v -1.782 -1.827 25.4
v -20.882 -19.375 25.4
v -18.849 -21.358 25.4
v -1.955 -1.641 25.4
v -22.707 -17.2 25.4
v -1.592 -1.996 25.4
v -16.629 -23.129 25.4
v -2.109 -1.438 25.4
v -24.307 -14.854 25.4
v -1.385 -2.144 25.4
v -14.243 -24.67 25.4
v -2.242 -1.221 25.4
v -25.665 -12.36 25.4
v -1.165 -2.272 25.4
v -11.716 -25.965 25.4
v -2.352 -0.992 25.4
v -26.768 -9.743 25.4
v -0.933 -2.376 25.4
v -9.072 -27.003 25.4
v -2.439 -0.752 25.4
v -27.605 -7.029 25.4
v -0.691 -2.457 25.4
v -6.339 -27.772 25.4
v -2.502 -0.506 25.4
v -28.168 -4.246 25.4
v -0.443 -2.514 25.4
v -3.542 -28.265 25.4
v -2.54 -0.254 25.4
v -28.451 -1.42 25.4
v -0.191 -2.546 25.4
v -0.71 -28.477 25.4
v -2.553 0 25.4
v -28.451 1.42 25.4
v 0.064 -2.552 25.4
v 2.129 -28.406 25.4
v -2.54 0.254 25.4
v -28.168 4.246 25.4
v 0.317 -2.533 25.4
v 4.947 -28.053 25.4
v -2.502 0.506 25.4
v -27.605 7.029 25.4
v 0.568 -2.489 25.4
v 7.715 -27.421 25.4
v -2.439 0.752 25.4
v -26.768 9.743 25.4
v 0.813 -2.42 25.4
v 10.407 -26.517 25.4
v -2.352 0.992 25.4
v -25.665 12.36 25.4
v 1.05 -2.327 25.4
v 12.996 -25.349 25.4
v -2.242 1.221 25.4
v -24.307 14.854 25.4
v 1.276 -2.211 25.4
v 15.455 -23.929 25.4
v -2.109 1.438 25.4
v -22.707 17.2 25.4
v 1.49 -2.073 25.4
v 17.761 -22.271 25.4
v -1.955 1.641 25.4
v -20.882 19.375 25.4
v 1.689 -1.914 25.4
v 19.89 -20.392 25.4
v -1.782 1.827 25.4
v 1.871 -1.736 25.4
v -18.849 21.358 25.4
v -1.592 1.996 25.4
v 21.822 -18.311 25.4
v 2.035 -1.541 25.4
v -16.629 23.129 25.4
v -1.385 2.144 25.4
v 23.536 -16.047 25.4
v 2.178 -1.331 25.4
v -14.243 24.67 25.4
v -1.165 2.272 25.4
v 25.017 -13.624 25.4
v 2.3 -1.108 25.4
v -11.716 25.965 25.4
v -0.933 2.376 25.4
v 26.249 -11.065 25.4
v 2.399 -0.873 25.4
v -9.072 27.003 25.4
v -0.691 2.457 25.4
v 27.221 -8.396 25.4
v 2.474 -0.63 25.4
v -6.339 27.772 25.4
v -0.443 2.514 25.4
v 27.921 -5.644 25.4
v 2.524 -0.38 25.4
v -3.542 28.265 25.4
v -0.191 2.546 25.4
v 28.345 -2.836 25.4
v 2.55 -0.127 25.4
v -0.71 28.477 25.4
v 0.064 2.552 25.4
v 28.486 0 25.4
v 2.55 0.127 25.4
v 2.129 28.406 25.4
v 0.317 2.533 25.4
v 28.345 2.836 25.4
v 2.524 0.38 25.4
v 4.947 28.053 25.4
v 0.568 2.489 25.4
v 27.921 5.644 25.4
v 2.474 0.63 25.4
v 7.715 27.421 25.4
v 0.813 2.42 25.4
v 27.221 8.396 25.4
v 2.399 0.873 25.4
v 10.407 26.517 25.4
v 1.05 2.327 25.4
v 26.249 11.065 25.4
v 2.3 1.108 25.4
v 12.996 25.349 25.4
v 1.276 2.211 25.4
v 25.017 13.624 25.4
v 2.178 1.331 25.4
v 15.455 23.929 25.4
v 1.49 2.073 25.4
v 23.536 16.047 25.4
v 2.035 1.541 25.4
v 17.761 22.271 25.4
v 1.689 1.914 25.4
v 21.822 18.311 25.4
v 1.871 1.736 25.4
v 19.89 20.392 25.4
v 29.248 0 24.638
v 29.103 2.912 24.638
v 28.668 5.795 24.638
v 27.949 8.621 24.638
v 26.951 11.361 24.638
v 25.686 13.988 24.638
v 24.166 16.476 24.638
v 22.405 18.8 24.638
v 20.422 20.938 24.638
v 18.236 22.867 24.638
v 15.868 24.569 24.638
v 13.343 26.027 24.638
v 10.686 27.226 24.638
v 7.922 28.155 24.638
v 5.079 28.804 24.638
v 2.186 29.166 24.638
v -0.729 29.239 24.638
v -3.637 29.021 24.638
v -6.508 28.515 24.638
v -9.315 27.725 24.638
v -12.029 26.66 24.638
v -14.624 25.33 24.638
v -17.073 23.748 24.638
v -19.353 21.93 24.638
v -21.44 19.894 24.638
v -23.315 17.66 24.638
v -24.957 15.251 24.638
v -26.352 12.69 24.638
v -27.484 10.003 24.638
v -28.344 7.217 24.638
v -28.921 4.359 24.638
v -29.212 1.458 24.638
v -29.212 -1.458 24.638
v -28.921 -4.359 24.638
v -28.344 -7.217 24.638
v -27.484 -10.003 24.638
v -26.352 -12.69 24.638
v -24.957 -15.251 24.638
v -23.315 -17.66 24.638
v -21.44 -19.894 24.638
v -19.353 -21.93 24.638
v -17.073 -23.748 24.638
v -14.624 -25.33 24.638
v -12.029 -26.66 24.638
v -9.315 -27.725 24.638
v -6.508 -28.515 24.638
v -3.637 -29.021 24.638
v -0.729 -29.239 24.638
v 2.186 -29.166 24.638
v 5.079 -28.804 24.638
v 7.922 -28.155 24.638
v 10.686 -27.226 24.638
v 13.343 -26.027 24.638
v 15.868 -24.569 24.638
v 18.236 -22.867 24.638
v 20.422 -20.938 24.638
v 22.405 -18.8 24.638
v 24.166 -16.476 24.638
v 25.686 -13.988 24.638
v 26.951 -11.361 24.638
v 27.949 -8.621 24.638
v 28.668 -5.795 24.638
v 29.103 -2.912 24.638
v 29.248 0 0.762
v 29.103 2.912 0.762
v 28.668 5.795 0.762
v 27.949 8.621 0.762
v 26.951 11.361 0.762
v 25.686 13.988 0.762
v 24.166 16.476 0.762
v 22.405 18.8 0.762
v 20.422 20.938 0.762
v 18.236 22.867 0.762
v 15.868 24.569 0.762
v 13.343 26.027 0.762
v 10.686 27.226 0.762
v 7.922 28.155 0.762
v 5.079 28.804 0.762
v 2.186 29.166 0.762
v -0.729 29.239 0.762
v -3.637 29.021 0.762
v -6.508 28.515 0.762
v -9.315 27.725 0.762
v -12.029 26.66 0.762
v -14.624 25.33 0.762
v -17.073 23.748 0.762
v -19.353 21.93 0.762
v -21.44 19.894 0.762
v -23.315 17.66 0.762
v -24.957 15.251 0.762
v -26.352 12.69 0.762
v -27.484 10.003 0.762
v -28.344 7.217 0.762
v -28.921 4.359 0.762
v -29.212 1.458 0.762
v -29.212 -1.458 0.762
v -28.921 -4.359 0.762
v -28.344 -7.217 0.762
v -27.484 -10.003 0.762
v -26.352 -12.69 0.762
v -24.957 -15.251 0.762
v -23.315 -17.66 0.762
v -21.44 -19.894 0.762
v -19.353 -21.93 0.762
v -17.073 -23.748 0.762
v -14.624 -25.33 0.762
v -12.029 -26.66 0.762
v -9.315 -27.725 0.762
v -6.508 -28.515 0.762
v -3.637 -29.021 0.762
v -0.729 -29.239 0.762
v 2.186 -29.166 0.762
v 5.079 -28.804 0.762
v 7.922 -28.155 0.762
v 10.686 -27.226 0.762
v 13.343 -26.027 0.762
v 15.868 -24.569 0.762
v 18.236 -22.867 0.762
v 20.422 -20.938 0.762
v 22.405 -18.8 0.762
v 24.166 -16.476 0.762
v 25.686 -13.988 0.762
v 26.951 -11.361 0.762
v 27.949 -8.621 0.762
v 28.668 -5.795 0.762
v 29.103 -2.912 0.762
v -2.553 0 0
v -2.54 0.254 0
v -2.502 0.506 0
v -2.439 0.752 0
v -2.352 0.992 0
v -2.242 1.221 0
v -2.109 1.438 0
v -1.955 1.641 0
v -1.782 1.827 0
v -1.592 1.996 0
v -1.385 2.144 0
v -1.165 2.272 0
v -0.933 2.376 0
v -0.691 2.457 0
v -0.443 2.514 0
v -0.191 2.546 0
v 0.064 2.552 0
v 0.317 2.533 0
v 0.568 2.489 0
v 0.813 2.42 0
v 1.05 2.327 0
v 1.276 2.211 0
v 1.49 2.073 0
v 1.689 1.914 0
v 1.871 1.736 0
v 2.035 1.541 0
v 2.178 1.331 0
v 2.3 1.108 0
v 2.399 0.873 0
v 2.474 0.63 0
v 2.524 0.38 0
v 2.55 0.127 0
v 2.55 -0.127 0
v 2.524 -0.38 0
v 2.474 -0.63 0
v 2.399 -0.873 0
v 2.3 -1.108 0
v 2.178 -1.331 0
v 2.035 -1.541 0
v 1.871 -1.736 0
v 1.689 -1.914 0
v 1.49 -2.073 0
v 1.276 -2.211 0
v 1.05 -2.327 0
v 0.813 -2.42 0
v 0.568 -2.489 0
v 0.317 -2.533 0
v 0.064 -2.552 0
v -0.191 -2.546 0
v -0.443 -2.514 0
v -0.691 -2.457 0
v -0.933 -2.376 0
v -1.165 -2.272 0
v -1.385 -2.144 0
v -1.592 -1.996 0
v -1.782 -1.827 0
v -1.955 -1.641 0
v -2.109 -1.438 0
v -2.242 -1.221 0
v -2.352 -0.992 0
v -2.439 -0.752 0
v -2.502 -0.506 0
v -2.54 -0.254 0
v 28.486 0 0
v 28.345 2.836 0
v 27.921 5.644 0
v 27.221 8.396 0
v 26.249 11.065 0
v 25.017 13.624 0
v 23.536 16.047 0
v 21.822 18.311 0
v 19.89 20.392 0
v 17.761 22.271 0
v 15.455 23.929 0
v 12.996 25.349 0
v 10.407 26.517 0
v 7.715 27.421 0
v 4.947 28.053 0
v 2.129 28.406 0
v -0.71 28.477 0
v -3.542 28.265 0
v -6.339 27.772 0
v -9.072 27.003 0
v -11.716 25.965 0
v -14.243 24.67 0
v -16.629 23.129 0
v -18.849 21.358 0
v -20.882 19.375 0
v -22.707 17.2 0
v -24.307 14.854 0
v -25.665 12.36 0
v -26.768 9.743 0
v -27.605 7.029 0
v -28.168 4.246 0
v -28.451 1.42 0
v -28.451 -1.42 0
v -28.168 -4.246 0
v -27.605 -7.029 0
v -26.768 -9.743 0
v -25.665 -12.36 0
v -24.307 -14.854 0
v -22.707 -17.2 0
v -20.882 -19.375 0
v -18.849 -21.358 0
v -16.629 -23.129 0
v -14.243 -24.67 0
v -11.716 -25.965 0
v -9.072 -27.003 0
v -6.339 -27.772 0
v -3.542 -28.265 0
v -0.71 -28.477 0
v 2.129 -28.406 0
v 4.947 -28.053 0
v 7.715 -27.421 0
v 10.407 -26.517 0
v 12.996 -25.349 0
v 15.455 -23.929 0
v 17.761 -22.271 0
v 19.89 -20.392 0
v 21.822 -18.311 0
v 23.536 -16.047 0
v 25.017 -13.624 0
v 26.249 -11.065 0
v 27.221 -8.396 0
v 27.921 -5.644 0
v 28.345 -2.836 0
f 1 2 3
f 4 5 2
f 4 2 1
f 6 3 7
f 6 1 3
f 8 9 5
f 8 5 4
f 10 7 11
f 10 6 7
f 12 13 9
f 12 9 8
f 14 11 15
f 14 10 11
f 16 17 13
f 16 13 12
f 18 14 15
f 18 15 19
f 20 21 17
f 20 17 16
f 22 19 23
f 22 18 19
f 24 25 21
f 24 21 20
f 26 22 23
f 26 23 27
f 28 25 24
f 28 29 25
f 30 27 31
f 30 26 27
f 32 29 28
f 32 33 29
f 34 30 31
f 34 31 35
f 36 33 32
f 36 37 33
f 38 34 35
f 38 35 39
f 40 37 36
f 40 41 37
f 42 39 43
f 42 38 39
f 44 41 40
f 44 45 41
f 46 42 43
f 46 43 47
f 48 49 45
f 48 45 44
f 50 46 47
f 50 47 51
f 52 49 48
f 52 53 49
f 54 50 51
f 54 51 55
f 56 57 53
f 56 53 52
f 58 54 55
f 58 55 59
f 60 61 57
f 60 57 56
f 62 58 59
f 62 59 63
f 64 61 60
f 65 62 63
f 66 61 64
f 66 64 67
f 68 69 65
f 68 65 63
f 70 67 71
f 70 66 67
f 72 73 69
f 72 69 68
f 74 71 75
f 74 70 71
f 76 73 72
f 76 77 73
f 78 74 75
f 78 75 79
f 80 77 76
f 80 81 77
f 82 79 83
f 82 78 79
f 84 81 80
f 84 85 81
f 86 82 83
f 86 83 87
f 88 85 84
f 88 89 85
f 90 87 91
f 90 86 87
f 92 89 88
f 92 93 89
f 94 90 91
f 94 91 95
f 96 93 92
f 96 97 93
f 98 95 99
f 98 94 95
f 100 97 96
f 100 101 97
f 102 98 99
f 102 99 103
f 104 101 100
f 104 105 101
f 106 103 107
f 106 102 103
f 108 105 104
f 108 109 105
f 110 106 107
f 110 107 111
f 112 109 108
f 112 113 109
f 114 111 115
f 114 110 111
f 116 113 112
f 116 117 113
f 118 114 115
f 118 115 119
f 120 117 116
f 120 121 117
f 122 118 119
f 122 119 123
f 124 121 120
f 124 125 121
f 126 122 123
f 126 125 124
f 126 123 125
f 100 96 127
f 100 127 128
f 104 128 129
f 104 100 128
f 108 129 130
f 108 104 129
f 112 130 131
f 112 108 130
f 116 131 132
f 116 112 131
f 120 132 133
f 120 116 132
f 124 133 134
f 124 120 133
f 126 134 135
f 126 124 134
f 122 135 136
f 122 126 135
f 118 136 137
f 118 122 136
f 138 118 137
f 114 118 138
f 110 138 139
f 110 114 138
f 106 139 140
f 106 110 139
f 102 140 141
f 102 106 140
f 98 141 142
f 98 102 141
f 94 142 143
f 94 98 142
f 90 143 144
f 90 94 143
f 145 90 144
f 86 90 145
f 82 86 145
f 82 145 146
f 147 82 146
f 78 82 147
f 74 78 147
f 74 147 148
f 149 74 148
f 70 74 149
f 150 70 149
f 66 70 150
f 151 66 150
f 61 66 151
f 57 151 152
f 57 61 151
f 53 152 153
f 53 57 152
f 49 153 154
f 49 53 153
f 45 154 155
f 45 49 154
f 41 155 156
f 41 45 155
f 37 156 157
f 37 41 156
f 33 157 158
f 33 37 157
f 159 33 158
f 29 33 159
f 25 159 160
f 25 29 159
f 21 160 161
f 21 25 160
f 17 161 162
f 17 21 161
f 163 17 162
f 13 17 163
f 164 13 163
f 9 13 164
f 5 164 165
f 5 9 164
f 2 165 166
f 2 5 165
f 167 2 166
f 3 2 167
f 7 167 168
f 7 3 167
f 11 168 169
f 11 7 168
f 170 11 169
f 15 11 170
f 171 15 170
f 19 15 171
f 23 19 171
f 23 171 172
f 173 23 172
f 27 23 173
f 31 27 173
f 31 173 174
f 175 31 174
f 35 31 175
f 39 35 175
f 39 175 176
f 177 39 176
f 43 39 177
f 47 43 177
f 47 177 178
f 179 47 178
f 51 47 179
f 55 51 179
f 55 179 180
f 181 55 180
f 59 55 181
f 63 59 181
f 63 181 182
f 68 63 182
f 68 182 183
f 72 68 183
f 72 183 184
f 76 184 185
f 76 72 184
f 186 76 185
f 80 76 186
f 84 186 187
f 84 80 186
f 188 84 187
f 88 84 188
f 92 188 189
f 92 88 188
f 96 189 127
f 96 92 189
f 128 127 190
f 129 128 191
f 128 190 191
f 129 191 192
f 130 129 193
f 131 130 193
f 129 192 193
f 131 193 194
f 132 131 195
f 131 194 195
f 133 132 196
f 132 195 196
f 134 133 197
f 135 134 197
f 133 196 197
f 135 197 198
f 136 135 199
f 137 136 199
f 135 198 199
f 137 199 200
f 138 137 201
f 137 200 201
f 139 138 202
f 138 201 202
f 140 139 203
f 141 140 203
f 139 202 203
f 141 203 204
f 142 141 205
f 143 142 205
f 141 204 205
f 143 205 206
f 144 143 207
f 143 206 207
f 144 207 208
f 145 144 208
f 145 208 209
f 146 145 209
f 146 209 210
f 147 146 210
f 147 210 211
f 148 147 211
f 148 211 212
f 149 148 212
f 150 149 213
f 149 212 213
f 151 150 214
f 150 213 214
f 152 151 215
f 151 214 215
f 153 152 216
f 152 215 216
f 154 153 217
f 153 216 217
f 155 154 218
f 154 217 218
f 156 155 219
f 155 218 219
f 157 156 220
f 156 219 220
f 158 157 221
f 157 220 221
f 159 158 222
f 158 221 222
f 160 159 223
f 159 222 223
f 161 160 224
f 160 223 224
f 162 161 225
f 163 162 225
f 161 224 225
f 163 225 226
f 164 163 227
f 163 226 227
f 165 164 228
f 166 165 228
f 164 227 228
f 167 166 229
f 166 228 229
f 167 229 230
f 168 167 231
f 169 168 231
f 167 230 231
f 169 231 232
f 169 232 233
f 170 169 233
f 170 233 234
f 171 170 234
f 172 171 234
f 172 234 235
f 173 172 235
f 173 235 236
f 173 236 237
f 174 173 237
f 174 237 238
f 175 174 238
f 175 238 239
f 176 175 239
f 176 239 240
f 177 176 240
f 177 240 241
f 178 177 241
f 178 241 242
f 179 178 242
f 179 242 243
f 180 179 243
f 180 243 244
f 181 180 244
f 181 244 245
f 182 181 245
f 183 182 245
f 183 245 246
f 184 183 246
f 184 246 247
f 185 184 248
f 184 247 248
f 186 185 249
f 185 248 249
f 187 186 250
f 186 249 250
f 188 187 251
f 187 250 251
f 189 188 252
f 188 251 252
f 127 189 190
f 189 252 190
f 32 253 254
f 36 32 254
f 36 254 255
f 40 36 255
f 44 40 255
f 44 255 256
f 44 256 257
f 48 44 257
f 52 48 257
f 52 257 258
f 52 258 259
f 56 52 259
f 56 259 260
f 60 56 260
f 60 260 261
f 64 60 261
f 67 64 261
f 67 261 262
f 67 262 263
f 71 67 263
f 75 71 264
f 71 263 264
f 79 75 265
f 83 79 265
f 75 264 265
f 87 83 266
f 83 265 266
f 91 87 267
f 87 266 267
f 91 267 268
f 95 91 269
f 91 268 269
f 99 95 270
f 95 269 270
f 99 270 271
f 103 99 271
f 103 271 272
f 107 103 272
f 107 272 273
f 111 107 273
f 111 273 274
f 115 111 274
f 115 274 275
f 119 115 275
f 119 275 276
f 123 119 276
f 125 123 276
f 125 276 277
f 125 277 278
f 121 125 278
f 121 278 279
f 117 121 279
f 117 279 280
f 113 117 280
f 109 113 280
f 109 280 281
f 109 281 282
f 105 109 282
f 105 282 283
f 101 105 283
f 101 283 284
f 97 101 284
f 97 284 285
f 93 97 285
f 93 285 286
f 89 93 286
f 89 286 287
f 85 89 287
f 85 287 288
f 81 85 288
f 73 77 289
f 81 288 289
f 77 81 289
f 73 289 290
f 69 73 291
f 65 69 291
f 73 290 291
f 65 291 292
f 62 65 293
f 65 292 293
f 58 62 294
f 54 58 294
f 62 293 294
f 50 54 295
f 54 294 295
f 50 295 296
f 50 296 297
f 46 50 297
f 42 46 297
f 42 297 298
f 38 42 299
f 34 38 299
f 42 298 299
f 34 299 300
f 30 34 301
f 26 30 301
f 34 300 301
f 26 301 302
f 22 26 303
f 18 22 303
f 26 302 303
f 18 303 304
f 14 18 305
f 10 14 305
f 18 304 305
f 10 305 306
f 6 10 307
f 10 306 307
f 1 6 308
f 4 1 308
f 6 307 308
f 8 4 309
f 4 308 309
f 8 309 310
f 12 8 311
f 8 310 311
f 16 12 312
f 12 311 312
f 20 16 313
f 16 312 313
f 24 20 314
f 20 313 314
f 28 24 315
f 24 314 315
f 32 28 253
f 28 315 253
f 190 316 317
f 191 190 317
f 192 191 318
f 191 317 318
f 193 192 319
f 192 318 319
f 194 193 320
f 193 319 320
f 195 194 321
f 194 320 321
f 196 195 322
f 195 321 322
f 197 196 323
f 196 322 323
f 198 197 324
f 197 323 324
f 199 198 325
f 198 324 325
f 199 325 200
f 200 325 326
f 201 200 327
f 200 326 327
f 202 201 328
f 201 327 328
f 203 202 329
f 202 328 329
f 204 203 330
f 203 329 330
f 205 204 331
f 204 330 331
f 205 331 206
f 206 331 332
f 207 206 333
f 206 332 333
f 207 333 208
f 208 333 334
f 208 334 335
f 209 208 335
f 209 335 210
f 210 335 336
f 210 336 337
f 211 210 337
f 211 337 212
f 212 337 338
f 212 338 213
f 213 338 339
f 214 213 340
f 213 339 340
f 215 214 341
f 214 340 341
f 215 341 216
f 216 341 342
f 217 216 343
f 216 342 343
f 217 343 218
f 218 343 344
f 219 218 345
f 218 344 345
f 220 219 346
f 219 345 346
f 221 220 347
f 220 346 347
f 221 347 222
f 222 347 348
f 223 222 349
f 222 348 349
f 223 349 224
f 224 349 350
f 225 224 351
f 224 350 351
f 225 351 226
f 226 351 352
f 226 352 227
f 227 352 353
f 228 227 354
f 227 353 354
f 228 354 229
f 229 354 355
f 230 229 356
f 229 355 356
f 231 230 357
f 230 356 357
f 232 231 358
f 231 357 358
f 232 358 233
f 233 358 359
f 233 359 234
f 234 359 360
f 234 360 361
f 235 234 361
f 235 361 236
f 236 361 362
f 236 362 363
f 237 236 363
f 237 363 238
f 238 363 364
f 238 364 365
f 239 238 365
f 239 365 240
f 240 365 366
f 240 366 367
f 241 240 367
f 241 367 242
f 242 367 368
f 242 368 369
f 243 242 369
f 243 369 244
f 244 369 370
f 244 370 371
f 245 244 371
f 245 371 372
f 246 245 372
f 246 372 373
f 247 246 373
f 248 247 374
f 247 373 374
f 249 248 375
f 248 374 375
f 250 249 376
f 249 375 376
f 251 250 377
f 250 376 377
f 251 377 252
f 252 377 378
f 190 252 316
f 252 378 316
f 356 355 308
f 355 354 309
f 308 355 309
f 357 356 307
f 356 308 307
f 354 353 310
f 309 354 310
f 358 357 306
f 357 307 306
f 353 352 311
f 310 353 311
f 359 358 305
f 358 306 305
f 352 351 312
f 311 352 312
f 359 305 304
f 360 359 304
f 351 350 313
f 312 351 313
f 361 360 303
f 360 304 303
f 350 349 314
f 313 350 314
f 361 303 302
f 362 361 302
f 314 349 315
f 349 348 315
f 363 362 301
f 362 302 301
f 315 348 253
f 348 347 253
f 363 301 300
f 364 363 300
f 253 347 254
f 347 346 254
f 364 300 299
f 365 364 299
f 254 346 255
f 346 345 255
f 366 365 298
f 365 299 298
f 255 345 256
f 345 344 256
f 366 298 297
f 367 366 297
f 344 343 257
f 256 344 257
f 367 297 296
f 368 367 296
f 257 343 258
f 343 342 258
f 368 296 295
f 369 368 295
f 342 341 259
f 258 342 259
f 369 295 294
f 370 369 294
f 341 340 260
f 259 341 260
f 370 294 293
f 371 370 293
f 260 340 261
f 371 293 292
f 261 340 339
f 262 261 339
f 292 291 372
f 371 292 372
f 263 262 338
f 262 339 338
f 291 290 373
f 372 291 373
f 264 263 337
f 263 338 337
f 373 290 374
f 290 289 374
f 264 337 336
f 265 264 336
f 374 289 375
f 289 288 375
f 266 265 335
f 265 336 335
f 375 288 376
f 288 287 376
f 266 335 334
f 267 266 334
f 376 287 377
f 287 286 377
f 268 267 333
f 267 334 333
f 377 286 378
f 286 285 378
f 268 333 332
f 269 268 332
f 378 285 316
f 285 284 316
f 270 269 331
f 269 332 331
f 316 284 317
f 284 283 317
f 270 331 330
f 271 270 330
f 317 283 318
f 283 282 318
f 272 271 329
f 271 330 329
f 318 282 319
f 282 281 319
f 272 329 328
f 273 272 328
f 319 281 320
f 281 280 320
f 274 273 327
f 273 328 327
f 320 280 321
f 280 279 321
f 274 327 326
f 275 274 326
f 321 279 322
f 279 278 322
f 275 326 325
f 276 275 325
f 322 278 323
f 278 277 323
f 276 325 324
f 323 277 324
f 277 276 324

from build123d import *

# Parameters (mm, degrees)
F0_R     = 29.2481
F1_DEPTH = 25.4
F2_SIZE  = 0.762
F4_D     = 5.1054


with BuildPart() as f1:
    # F0 (on Top) → F1 (new body)
    with BuildSketch(Plane.XY):
        Circle(F0_R)
    extrude(amount=F1_DEPTH)

    # F2
    f2_edges = [f1.edges().sort_by_distance(p)[0] for p in [
        (-29.2481, 0, 25.4),
        (-29.2481, 0, 0),
    ]]
    chamfer(f2_edges, length=F2_SIZE)

    # F4 (through all)
    with Locations(Plane.XY.offset(25.4)):
        with Locations((0, 0)):
            Hole(F4_D / 2)


solid = f1.part
